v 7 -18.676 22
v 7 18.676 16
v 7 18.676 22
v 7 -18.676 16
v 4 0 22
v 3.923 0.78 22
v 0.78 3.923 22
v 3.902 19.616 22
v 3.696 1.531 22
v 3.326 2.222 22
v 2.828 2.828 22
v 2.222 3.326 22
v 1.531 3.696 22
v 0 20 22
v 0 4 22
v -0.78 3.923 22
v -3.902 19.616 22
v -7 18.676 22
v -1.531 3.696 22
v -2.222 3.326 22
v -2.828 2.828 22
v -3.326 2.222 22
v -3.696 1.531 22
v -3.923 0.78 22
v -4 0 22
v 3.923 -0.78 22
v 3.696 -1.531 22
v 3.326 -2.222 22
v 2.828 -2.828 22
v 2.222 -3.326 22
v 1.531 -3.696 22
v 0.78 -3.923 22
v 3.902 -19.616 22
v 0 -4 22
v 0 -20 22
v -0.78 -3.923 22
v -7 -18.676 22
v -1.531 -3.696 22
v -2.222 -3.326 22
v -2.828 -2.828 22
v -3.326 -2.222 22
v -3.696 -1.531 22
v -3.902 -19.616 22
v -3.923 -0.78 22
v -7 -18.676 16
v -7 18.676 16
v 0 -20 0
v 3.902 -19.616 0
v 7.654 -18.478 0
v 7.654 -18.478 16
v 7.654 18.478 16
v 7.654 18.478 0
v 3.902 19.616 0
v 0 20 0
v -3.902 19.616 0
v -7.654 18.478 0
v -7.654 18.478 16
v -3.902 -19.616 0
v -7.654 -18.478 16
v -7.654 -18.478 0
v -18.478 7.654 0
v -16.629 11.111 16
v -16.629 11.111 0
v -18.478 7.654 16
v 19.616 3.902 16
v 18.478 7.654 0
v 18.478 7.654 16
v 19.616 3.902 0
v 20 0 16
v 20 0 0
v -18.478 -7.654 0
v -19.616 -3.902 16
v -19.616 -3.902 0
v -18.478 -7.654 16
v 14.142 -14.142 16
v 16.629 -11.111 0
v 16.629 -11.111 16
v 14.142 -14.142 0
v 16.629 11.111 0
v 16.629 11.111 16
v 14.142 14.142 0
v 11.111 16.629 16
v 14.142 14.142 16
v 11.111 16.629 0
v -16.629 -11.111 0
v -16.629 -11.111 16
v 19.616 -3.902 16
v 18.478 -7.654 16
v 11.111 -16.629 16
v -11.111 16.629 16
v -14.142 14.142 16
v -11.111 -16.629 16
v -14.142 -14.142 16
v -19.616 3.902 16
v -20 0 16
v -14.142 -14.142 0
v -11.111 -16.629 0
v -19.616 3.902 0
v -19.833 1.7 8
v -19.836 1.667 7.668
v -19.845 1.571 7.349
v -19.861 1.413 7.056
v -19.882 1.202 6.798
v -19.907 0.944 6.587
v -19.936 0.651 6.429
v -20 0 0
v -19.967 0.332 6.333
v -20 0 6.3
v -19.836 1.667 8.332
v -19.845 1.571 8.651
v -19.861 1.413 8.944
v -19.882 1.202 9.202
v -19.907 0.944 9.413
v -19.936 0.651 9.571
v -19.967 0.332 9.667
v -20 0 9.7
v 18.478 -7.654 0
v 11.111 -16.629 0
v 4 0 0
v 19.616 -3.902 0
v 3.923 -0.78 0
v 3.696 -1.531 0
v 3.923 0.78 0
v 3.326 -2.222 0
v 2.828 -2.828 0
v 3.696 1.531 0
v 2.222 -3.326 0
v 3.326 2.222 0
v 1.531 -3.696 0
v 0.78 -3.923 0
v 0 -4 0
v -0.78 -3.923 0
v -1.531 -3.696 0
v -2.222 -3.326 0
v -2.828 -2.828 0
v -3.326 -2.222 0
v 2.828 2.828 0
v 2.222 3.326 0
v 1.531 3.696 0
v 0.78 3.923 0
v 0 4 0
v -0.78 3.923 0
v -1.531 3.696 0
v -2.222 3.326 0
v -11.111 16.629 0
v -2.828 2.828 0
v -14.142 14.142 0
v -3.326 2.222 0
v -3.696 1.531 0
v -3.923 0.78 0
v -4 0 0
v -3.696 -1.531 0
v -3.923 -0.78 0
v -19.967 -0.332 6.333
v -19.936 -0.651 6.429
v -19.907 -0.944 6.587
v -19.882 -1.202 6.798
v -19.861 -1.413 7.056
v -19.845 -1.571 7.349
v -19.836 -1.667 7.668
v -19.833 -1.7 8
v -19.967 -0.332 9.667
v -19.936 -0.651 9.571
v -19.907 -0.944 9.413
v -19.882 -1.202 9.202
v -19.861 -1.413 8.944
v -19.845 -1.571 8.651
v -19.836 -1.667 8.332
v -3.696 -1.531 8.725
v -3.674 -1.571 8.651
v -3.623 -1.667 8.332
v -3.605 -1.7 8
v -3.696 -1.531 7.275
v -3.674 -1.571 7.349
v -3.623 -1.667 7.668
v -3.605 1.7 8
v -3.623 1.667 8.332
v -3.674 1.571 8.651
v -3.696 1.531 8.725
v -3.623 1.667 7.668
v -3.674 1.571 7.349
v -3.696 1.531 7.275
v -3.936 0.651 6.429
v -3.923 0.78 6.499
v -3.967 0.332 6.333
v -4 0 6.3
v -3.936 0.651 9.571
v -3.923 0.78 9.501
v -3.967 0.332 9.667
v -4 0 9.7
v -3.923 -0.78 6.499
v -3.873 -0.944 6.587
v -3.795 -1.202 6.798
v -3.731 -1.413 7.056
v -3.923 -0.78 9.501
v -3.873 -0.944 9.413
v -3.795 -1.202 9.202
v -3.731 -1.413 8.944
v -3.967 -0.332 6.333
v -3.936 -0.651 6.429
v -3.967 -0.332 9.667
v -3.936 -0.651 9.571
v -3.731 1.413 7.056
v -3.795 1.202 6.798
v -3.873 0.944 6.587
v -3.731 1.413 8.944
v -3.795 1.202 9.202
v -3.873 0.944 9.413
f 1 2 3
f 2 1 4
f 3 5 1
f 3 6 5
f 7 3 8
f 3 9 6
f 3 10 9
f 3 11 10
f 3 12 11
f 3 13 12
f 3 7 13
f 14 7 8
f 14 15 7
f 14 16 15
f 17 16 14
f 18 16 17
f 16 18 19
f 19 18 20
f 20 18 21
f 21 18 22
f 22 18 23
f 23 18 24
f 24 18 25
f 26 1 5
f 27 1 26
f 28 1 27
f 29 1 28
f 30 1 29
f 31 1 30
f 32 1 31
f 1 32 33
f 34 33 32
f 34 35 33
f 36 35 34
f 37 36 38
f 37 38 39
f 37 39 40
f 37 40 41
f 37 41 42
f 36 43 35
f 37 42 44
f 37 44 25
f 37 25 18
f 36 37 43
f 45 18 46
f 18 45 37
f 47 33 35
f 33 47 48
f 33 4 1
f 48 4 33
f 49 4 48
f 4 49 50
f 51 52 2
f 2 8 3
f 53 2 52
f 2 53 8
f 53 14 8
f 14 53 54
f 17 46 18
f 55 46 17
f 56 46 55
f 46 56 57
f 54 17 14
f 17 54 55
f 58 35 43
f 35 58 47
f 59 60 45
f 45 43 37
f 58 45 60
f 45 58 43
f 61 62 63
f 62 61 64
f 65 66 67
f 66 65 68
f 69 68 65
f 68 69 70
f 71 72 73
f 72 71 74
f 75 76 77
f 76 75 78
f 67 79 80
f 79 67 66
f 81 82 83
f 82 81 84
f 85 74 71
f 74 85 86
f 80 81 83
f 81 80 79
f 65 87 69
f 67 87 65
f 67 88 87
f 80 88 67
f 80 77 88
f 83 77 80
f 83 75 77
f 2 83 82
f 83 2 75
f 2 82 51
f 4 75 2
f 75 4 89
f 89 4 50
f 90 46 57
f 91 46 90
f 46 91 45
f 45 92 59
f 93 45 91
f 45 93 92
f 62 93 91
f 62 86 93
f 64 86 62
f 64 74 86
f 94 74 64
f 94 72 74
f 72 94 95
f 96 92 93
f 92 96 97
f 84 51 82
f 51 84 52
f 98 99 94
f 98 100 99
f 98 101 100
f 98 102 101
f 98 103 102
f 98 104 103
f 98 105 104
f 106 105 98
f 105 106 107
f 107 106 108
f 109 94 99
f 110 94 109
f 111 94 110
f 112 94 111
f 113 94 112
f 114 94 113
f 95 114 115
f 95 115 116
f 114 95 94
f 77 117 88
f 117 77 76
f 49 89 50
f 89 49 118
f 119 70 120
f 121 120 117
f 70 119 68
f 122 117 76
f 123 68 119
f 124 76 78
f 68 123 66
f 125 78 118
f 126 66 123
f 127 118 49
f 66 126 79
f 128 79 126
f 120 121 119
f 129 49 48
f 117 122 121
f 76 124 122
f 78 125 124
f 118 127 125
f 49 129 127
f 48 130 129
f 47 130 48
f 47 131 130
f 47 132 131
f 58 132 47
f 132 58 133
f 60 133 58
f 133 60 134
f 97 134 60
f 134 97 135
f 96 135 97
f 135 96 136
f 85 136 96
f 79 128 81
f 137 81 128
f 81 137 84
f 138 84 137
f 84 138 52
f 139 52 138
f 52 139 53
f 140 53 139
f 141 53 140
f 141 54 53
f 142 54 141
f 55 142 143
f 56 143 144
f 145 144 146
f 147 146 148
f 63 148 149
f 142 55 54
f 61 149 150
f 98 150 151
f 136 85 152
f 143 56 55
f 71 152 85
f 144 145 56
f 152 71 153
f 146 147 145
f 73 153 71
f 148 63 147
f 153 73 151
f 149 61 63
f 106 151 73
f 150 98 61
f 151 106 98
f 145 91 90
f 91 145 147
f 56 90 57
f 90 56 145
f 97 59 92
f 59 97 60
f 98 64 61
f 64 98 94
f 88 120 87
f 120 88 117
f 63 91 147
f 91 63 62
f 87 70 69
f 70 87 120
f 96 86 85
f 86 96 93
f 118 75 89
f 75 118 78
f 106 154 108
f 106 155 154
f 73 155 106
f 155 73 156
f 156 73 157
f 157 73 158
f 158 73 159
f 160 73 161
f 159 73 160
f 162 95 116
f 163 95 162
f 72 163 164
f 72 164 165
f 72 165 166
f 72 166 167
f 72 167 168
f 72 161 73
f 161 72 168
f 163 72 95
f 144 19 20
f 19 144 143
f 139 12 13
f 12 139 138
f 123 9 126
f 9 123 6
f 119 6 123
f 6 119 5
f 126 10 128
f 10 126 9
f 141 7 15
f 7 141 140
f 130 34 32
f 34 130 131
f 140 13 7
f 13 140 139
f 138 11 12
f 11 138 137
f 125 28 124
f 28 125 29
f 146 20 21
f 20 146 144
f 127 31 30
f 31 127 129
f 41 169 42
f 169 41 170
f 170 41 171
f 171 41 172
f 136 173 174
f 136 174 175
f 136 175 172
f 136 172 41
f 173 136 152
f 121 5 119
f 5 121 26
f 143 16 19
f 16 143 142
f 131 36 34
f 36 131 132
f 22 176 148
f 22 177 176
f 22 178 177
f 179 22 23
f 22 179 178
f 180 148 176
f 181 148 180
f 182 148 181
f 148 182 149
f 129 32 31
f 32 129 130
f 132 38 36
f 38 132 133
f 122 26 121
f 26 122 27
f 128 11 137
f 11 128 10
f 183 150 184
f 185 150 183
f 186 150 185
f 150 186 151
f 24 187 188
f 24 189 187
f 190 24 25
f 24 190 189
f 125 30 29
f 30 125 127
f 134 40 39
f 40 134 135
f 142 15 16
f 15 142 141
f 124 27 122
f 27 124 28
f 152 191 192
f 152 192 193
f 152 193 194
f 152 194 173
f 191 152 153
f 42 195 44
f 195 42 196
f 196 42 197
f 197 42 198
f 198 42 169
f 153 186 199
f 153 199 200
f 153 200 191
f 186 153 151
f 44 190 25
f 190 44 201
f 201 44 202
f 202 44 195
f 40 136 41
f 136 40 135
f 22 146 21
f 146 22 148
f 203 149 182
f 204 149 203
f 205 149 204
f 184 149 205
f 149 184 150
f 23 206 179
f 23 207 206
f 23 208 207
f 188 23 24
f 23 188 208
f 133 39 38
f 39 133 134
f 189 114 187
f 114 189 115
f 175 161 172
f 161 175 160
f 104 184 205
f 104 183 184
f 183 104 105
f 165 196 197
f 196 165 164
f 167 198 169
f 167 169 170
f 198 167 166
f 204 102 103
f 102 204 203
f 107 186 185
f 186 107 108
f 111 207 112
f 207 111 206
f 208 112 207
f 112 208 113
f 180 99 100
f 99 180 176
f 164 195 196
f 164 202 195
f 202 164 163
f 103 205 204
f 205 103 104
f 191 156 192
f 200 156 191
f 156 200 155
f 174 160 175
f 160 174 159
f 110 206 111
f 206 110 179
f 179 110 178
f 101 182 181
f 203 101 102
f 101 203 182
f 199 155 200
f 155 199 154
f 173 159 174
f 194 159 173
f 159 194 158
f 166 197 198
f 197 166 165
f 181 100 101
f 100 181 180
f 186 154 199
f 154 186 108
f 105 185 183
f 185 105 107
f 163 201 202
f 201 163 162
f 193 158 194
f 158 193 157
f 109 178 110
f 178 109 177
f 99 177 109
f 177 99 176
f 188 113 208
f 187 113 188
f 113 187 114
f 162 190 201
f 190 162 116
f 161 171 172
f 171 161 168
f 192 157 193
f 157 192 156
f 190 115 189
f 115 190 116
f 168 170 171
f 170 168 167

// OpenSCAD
$fn = 32;

// ----------------------------------------------------------------------
// Oldham coupling hub: 40 x 22 mm
// ----------------------------------------------------------------------

// --- parameters (mm) ---
flange_dia = 40;          // hub diameter
flange_len = 16;          // hub length
hub_bore = 8;             // shaft bore
key_w = 14;               // drive tongue width
tongue_h = 6;             // drive tongue height
set_d = 3.4;              // set screw tap hole

module hub() {
  cylinder(h = flange_len, d = flange_dia);
  /* tongue, clipped to the hub disc and sunk 1 mm into the face */
  intersection() {
    translate([-key_w / 2, -flange_dia / 2, flange_len - 1])
      cube([key_w, flange_dia, tongue_h + 1]);
    translate([0, 0, flange_len - 1]) cylinder(h = tongue_h + 1, d = flange_dia);
  }
}

difference() {
  hub();
  translate([0, 0, -1]) cylinder(h = flange_len + tongue_h + 2, d = hub_bore);
  translate([-flange_dia / 2 - 1, 0, flange_len * 0.5])
    rotate([0, 90, 0]) cylinder(h = flange_dia / 2 + 2, d = set_d);
}
